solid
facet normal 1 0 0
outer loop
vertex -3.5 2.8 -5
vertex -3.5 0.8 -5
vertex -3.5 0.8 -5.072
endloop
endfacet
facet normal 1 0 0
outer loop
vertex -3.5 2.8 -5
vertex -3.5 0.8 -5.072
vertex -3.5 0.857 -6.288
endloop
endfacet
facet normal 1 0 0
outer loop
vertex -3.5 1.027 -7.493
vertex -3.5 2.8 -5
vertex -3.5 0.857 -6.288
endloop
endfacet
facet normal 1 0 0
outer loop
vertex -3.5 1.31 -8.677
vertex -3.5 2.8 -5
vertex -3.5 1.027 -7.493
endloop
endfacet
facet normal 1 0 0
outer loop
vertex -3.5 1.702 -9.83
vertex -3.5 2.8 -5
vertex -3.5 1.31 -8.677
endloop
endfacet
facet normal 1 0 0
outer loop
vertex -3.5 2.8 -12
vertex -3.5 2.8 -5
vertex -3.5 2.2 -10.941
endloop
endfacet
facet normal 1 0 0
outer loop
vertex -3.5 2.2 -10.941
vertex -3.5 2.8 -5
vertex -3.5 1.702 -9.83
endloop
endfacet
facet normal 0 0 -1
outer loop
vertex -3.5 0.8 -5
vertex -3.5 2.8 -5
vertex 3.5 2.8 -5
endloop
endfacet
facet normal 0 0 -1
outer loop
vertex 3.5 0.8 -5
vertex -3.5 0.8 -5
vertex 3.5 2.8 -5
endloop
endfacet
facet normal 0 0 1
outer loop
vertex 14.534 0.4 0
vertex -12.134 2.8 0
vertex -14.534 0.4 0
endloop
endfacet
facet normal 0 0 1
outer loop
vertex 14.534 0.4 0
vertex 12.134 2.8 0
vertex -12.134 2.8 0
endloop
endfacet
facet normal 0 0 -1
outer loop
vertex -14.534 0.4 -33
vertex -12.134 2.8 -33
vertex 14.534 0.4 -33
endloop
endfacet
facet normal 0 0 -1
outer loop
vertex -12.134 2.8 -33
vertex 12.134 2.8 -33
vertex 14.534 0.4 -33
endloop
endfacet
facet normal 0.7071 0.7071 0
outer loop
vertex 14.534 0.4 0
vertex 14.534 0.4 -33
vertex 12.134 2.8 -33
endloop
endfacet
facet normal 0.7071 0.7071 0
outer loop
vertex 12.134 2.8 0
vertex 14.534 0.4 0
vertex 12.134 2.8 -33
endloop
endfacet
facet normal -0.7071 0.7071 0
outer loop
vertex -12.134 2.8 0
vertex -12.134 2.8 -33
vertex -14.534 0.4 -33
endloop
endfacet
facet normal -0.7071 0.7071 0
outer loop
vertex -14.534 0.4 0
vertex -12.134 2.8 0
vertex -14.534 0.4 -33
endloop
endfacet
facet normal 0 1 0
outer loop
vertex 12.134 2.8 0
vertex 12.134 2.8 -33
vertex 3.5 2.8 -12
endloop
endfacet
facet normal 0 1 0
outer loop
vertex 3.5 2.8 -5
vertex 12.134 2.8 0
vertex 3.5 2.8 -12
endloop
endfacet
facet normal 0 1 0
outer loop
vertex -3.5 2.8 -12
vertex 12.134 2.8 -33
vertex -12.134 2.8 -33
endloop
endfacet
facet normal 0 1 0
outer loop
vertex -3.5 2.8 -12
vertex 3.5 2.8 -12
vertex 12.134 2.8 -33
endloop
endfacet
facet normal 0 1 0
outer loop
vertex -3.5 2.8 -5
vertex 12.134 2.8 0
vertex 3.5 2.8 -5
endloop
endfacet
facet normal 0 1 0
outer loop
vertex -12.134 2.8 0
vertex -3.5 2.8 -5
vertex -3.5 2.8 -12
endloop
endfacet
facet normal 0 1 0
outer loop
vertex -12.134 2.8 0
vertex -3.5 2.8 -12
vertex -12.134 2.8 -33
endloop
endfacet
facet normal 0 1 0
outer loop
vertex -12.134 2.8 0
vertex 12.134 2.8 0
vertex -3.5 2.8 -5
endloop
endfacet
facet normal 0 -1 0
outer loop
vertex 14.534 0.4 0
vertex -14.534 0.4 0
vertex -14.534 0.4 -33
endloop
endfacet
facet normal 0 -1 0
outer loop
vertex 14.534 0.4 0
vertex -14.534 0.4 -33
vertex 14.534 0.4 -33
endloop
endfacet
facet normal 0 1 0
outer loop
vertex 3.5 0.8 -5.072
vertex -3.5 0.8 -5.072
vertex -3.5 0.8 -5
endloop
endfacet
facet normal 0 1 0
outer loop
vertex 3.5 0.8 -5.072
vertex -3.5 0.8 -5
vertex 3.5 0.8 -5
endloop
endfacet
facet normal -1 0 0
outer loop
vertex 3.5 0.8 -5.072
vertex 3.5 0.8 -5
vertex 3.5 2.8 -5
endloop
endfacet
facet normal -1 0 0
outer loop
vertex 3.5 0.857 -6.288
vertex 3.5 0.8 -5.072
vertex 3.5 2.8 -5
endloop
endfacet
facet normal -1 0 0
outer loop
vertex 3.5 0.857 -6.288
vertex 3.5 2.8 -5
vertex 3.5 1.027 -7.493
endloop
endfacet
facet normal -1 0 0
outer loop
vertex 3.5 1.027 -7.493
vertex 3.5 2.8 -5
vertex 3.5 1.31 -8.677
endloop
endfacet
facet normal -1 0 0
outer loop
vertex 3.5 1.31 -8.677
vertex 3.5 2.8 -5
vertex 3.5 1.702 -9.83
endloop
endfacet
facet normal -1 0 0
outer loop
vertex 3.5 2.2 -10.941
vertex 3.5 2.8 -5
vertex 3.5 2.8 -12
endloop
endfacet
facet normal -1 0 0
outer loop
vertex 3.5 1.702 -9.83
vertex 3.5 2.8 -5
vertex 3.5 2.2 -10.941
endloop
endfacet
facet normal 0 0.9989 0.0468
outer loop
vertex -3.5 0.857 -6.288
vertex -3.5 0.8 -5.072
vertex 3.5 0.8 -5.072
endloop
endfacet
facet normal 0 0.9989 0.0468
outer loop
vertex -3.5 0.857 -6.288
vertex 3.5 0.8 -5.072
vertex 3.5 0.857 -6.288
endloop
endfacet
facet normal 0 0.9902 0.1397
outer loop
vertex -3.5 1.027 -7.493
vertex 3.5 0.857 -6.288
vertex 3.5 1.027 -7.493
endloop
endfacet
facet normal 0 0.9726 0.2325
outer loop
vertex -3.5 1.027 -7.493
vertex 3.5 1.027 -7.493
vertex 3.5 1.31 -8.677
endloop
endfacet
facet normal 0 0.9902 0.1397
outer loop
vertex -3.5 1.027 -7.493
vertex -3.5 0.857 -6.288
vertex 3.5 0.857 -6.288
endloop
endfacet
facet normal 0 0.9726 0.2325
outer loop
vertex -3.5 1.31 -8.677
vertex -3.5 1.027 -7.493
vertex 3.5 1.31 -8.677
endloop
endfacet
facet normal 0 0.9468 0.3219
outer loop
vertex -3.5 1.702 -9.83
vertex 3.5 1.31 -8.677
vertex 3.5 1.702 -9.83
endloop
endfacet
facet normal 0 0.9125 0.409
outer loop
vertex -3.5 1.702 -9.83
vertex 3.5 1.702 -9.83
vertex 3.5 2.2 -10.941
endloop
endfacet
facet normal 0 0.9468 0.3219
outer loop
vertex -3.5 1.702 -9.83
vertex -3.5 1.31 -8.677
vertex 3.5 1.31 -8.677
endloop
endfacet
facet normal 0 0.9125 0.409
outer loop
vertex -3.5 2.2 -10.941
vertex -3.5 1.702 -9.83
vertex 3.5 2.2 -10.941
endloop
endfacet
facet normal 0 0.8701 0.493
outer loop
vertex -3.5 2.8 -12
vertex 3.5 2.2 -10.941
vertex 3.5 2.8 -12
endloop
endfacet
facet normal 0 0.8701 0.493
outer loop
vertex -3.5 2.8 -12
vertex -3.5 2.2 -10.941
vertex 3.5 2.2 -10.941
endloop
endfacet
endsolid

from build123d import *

# Parameters (mm, degrees)
BOSS_EXTRUDE1_DEPTH = 33
SKETCH2_W           = 7
SKETCH2_H           = 7
CUT_EXTRUDE1_DEPTH  = 2
FILLET1_R           = 13


with BuildPart() as part:
    # Sketch1 → Boss-Extrude1 (new body)
    with BuildSketch(Plane.XY):
        Polygon((-12.134314575, 2.8), (-14.534314575, 0.4), (14.534314575, 0.4), (12.134314575, 2.8), align=None)
    extrude(amount=-BOSS_EXTRUDE1_DEPTH)

    # Sketch2 → Cut-Extrude1 (cut)
    with BuildSketch(Plane(origin=(0, 2.8, 0), x_dir=(1, 0, 0), z_dir=(0, 1, 0))):
        with Locations((0, 8.5)):
            Rectangle(SKETCH2_W, SKETCH2_H)
    extrude(amount=-CUT_EXTRUDE1_DEPTH, mode=Mode.SUBTRACT)

    # Fillet1
    # the kernel refuses this fillet: 13 mm, written as the material it adds along each edge
    with BuildSketch(Plane(origin=(-3.5, 0.8, -12), x_dir=(0, 1, 0), z_dir=(1, 0, 0))) as fillet1_piece_1:
        with BuildLine():
            CenterArc((13, 6.92820323), FILLET1_R, 180, 32.204227504)
            Line((0, 6.92820323), (0, 0))
            Line((0, 0), (2, 0))
        make_face()
    extrude(amount=7)


solid = part.part
